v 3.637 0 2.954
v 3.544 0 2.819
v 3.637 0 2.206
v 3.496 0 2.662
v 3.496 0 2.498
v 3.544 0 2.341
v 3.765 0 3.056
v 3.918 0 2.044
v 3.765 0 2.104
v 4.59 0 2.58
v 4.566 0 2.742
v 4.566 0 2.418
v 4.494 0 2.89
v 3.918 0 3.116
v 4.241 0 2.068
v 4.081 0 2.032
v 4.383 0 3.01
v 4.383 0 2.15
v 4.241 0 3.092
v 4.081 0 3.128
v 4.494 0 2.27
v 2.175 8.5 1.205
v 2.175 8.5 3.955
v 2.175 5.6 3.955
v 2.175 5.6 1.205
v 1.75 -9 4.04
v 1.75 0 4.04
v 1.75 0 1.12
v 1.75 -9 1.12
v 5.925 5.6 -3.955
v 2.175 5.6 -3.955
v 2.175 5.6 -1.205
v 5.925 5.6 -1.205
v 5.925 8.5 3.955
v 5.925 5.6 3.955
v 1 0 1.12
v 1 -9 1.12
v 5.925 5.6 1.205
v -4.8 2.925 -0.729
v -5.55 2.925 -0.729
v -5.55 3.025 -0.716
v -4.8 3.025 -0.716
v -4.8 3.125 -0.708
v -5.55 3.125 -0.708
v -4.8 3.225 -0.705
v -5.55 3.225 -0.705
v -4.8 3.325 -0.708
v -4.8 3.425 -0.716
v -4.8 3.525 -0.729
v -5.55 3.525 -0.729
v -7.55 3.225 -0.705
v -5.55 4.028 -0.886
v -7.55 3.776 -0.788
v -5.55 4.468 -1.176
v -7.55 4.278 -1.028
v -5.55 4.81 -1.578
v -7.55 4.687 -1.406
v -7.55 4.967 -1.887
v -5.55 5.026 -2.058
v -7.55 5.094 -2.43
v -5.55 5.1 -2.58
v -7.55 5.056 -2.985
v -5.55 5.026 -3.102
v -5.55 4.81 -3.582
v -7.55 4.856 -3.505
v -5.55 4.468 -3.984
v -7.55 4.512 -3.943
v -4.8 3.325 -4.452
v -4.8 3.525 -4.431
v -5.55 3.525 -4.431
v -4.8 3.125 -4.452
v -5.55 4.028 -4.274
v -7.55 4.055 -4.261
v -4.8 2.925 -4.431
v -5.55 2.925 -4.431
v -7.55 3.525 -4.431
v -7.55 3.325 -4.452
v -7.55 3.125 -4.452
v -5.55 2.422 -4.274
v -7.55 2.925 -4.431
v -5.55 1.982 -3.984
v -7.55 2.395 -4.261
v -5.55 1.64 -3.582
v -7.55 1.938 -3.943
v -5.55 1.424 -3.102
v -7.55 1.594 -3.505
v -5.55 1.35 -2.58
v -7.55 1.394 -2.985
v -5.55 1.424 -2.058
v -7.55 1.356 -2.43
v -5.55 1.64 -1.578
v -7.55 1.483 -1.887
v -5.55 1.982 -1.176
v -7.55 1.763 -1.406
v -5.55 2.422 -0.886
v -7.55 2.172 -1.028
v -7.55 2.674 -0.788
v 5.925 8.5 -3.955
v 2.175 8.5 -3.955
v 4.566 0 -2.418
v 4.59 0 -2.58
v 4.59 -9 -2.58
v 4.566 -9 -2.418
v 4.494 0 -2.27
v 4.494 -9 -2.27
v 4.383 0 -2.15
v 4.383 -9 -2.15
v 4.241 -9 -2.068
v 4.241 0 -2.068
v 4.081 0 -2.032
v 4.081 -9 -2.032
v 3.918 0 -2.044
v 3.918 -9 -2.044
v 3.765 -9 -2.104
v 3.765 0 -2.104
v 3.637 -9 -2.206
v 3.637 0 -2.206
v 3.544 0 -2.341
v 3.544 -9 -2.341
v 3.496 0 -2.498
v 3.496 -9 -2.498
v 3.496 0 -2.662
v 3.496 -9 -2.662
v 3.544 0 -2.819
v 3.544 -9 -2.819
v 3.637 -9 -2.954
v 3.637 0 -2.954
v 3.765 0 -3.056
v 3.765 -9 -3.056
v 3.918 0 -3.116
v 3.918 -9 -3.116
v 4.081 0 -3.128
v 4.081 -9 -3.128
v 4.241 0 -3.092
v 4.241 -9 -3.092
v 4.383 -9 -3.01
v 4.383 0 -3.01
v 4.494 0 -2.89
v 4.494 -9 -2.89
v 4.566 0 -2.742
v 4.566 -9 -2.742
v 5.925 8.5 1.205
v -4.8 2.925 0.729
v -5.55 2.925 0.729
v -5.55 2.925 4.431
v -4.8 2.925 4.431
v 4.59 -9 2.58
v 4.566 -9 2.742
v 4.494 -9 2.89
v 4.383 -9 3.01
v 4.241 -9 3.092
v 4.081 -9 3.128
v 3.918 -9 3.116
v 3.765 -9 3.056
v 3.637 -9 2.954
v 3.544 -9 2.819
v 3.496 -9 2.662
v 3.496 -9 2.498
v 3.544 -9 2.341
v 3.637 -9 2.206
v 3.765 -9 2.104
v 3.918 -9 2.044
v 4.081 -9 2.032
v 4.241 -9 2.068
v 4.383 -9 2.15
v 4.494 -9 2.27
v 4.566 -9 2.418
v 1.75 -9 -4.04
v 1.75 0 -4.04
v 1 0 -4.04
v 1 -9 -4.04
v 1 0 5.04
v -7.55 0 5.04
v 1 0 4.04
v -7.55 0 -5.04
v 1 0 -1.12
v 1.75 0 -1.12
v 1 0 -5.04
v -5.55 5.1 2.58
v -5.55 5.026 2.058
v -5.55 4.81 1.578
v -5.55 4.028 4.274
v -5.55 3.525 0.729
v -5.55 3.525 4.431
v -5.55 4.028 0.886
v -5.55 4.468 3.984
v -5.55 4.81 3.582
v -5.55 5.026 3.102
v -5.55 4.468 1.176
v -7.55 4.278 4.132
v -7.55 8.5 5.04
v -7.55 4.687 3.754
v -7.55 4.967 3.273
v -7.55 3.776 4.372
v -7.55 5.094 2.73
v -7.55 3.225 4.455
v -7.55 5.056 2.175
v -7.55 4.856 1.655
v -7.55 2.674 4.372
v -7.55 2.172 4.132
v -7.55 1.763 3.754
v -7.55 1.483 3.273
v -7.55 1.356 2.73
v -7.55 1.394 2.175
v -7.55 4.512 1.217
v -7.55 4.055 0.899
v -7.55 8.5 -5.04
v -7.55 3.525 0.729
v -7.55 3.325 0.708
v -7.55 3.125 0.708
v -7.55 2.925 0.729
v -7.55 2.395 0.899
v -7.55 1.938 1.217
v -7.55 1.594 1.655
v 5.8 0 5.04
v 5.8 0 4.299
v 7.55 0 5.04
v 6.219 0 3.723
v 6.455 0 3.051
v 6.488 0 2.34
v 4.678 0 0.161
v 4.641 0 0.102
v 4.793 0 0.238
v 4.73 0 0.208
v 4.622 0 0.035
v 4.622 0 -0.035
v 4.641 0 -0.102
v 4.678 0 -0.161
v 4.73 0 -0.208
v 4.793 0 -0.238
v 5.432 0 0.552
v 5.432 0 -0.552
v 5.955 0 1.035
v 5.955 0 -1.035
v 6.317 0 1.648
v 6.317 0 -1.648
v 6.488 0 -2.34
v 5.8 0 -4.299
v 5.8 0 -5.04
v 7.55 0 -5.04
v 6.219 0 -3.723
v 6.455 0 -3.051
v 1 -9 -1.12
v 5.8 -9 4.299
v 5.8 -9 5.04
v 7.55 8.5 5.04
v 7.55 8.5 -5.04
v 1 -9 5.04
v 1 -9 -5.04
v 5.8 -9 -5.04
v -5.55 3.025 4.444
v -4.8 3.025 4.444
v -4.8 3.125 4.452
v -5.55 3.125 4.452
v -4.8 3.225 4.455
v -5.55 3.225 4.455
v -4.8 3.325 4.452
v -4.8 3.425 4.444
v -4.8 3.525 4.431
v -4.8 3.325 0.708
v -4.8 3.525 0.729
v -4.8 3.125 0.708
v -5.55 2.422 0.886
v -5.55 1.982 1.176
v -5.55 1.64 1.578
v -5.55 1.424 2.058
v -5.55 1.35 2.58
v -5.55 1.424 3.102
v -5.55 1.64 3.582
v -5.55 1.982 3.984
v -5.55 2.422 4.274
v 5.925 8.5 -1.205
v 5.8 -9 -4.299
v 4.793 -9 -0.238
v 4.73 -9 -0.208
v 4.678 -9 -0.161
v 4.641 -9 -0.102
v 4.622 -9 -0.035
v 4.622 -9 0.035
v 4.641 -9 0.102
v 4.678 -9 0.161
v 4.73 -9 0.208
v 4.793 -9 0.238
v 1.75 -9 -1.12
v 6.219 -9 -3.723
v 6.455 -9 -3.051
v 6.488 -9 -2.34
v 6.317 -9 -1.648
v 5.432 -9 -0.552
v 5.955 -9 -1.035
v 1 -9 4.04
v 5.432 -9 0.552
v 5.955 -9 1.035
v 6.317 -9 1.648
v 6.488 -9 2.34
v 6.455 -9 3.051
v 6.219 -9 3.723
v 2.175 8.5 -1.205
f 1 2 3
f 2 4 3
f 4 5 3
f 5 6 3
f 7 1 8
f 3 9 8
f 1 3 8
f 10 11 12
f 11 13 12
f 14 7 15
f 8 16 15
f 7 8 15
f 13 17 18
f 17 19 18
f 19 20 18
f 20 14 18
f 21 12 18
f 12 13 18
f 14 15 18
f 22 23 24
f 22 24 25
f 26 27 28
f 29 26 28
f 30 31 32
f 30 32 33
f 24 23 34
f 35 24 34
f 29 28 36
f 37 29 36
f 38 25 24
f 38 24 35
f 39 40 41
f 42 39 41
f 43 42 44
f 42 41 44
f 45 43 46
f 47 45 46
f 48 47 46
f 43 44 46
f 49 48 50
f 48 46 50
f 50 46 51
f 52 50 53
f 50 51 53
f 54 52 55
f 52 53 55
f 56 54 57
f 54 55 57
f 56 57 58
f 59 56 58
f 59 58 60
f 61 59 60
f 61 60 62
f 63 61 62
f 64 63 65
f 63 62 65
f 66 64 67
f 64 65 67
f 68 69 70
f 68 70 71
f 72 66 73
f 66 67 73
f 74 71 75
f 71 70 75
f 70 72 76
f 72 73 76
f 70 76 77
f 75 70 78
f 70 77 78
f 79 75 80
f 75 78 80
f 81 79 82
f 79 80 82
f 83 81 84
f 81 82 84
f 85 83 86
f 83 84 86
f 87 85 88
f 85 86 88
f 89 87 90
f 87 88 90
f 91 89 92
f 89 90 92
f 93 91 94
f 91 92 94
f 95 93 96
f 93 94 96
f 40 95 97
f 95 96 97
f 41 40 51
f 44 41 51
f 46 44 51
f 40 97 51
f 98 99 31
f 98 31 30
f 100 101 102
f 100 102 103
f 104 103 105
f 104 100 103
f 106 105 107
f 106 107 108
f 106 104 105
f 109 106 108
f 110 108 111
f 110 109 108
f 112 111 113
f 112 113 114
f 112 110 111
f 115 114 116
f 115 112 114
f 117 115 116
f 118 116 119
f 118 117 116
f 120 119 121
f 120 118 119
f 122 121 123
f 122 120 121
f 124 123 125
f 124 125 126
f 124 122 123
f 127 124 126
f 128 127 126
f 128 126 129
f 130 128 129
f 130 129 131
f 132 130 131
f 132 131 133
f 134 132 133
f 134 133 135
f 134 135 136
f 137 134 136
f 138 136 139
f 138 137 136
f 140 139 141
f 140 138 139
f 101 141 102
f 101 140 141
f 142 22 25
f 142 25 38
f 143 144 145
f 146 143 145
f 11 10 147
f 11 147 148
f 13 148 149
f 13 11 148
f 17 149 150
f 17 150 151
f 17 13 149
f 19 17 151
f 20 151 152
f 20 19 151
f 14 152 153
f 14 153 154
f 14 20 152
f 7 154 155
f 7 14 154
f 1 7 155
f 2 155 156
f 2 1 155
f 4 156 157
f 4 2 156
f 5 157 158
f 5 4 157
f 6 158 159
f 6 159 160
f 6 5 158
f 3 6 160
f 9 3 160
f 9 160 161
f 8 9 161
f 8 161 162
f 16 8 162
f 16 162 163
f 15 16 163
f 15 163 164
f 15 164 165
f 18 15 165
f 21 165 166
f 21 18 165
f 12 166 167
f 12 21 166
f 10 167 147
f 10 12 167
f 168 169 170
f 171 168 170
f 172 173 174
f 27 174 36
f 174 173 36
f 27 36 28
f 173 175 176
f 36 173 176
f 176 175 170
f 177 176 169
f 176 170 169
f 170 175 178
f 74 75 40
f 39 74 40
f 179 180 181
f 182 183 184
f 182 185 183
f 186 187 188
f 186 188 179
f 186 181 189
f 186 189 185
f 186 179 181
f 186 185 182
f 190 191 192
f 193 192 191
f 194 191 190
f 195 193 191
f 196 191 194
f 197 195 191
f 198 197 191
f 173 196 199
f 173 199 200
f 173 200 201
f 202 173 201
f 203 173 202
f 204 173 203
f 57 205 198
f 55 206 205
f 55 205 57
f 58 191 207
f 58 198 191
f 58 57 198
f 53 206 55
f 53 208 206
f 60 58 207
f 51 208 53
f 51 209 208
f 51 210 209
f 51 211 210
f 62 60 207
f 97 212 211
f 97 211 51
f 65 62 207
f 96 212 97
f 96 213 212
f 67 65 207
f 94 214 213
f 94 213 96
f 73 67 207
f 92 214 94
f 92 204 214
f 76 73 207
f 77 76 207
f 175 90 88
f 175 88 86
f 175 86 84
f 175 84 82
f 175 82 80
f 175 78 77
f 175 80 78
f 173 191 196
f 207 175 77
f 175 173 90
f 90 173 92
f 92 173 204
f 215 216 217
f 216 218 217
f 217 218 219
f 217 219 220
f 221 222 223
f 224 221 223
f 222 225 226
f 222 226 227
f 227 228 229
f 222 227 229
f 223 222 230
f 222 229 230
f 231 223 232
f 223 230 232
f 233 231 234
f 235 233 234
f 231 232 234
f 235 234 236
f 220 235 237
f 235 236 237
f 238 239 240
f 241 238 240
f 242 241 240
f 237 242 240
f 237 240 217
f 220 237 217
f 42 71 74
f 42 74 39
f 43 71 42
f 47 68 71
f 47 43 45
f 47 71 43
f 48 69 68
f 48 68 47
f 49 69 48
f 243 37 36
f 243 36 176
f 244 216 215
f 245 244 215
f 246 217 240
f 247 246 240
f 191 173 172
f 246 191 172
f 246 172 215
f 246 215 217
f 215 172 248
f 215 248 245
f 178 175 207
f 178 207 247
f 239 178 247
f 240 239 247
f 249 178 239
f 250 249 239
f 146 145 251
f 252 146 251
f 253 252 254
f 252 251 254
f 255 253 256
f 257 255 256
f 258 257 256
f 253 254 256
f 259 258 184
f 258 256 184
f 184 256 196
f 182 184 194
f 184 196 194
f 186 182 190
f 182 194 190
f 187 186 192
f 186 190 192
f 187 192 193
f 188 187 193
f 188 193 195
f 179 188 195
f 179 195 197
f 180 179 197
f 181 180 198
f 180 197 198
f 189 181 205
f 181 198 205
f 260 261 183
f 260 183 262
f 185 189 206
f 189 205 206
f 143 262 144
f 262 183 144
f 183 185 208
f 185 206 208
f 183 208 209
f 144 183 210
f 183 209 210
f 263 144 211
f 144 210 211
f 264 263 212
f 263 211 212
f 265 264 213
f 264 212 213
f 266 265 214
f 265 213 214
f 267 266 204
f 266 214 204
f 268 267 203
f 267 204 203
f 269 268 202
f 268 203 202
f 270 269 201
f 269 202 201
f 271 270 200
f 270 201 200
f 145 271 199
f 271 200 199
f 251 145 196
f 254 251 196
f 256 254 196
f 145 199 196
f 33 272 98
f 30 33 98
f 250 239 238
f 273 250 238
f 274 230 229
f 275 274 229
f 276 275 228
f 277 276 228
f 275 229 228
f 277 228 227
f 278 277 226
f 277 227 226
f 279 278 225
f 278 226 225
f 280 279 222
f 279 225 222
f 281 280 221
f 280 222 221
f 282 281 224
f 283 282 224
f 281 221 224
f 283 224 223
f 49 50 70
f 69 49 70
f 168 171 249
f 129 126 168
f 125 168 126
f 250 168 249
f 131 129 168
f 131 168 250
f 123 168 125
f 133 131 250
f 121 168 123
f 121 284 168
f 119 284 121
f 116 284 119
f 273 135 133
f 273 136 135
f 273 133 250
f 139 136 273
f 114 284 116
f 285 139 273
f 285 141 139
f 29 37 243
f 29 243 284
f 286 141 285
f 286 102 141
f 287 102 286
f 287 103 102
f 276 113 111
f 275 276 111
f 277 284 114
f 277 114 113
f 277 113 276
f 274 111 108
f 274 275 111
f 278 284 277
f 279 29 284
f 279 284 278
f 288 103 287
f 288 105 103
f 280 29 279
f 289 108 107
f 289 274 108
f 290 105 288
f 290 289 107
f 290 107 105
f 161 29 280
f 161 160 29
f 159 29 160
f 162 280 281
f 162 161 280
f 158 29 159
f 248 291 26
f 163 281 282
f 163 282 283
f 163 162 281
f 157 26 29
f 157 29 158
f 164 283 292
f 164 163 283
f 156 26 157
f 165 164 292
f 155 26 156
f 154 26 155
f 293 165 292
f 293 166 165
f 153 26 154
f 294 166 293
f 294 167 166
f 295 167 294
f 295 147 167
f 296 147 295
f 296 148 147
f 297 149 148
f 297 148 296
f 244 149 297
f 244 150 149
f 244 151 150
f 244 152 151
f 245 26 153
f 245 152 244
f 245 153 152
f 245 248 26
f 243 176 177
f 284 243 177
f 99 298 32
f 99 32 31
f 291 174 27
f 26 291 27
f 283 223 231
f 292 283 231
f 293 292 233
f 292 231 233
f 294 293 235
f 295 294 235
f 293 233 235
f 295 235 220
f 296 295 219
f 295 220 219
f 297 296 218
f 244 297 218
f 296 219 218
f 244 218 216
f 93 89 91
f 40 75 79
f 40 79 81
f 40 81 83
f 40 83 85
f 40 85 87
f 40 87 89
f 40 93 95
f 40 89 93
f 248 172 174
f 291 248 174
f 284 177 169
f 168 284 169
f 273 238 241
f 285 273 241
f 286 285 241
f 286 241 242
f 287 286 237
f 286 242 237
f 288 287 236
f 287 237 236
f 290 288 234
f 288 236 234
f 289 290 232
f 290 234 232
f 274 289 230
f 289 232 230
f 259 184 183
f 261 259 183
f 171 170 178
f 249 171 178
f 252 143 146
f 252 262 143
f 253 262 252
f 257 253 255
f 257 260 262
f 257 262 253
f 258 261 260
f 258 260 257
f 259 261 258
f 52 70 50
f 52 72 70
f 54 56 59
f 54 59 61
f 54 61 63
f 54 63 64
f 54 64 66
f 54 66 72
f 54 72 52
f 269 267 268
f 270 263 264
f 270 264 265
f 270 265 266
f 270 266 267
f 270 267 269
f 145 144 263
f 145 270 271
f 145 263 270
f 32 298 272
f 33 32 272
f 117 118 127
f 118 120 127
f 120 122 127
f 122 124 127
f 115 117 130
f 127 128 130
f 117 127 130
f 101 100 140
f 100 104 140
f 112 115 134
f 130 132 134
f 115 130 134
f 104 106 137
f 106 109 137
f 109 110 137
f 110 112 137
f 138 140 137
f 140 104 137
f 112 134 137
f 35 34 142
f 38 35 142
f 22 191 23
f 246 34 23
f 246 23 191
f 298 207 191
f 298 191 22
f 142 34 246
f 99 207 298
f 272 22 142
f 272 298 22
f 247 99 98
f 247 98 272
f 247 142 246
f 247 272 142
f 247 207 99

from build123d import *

# Parameters (mm, degrees)
SKETCH1_W           = 15.1
SKETCH1_H           = 10.08
BOSS_EXTRUDE1_DEPTH = 8.5
SKETCH2_R           = 0.55
BOSS_EXTRUDE2_DEPTH = 9
SKETCH3_R           = 1.875
CUT_EXTRUDE1_DEPTH  = 2
CUT_EXTRUDE2_DEPTH  = 2.75
SKETCH4_W           = 3.75
SKETCH4_H           = 2.75
CUT_EXTRUDE3_DEPTH  = 2.9


with BuildPart() as part:
    # Sketch1 → Boss-Extrude1 (new body)
    with BuildSketch(Plane(origin=(0, 0, 0), x_dir=(1, 0, 0), z_dir=(0, 1, 0))):
        Rectangle(SKETCH1_W, SKETCH1_H)
    extrude(amount=BOSS_EXTRUDE1_DEPTH)

    # Sketch2 → Boss-Extrude2 (add)
    with BuildSketch(Plane.XZ):
        with BuildLine():
            Line((5.8, 4.298720454), (5.8, 5.04))
            Line((5.8, 5.04), (1, 5.04))
            Line((1, 5.04), (1, 4.04))
            Line((1, 4.04), (1.75, 4.04))
            Line((1.75, 4.04), (1.75, 1.12))
            Line((1.75, 1.12), (1, 1.12))
            Line((1, 1.12), (1, -1.12))
            Line((1, -1.12), (1.75, -1.12))
            Line((1.75, -1.12), (1.75, -4.04))
            Line((1.75, -4.04), (1, -4.04))
            Line((1, -4.04), (1, -5.04))
            Line((1, -5.04), (5.8, -5.04))
            Line((5.8, -5.04), (5.8, -4.298720454))
            ThreePointArc((5.8, -4.298720454), (6.427646859, -1.987764848), (4.792775244, -0.23800738))
            ThreePointArc((4.792775244, -0.23800738), (4.619276793, 0), (4.792775244, 0.23800738))
            ThreePointArc((4.792775244, 0.23800738), (6.427646859, 1.987764848), (5.8, 4.298720454))
        make_face()
        with Locations((4.04, 2.58)):
            Circle(SKETCH2_R, mode=Mode.SUBTRACT)
        with Locations((4.04, -2.58)):
            Circle(SKETCH2_R, mode=Mode.SUBTRACT)
    extrude(amount=BOSS_EXTRUDE2_DEPTH)

    # Sketch3 → Cut-Extrude1 (cut)
    with BuildSketch(Plane.ZY.offset(7.55)):
        with Locations((-2.58, 3.225)):
            Circle(SKETCH3_R)
        with Locations((2.58, 3.225)):
            Circle(SKETCH3_R)
    extrude(amount=-CUT_EXTRUDE1_DEPTH, mode=Mode.SUBTRACT)

    # Sketch3<3> → Cut-Extrude2 (cut)
    with BuildSketch(Plane.ZY.offset(7.55)):
        with BuildLine():
            Line((-0.729155598, 3.525), (-4.430844402, 3.525))
            ThreePointArc((-4.430844402, 3.525), (-4.455, 3.225), (-4.430844402, 2.925))
            Line((-4.430844402, 2.925), (-0.729155598, 2.925))
            ThreePointArc((-0.729155598, 2.925), (-0.705, 3.225), (-0.729155598, 3.525))
        make_face()
        with BuildLine():
            Line((0.729155598, 2.925), (4.430844402, 2.925))
            ThreePointArc((4.430844402, 2.925), (4.455, 3.225), (4.430844402, 3.525))
            Line((4.430844402, 3.525), (0.729155598, 3.525))
            ThreePointArc((0.729155598, 3.525), (0.705, 3.225), (0.729155598, 2.925))
        make_face()
    extrude(amount=-CUT_EXTRUDE2_DEPTH, mode=Mode.SUBTRACT)

    # Sketch4 → Cut-Extrude3 (cut)
    with BuildSketch(Plane(origin=(0, 8.5, 0), x_dir=(1, 0, 0), z_dir=(0, 1, 0))):
        with Locations((4.05, -2.58)):
            Rectangle(SKETCH4_W, SKETCH4_H)
        with Locations((4.05, 2.58)):
            Rectangle(SKETCH4_W, SKETCH4_H)
    extrude(amount=-CUT_EXTRUDE3_DEPTH, mode=Mode.SUBTRACT)


solid = part.part
